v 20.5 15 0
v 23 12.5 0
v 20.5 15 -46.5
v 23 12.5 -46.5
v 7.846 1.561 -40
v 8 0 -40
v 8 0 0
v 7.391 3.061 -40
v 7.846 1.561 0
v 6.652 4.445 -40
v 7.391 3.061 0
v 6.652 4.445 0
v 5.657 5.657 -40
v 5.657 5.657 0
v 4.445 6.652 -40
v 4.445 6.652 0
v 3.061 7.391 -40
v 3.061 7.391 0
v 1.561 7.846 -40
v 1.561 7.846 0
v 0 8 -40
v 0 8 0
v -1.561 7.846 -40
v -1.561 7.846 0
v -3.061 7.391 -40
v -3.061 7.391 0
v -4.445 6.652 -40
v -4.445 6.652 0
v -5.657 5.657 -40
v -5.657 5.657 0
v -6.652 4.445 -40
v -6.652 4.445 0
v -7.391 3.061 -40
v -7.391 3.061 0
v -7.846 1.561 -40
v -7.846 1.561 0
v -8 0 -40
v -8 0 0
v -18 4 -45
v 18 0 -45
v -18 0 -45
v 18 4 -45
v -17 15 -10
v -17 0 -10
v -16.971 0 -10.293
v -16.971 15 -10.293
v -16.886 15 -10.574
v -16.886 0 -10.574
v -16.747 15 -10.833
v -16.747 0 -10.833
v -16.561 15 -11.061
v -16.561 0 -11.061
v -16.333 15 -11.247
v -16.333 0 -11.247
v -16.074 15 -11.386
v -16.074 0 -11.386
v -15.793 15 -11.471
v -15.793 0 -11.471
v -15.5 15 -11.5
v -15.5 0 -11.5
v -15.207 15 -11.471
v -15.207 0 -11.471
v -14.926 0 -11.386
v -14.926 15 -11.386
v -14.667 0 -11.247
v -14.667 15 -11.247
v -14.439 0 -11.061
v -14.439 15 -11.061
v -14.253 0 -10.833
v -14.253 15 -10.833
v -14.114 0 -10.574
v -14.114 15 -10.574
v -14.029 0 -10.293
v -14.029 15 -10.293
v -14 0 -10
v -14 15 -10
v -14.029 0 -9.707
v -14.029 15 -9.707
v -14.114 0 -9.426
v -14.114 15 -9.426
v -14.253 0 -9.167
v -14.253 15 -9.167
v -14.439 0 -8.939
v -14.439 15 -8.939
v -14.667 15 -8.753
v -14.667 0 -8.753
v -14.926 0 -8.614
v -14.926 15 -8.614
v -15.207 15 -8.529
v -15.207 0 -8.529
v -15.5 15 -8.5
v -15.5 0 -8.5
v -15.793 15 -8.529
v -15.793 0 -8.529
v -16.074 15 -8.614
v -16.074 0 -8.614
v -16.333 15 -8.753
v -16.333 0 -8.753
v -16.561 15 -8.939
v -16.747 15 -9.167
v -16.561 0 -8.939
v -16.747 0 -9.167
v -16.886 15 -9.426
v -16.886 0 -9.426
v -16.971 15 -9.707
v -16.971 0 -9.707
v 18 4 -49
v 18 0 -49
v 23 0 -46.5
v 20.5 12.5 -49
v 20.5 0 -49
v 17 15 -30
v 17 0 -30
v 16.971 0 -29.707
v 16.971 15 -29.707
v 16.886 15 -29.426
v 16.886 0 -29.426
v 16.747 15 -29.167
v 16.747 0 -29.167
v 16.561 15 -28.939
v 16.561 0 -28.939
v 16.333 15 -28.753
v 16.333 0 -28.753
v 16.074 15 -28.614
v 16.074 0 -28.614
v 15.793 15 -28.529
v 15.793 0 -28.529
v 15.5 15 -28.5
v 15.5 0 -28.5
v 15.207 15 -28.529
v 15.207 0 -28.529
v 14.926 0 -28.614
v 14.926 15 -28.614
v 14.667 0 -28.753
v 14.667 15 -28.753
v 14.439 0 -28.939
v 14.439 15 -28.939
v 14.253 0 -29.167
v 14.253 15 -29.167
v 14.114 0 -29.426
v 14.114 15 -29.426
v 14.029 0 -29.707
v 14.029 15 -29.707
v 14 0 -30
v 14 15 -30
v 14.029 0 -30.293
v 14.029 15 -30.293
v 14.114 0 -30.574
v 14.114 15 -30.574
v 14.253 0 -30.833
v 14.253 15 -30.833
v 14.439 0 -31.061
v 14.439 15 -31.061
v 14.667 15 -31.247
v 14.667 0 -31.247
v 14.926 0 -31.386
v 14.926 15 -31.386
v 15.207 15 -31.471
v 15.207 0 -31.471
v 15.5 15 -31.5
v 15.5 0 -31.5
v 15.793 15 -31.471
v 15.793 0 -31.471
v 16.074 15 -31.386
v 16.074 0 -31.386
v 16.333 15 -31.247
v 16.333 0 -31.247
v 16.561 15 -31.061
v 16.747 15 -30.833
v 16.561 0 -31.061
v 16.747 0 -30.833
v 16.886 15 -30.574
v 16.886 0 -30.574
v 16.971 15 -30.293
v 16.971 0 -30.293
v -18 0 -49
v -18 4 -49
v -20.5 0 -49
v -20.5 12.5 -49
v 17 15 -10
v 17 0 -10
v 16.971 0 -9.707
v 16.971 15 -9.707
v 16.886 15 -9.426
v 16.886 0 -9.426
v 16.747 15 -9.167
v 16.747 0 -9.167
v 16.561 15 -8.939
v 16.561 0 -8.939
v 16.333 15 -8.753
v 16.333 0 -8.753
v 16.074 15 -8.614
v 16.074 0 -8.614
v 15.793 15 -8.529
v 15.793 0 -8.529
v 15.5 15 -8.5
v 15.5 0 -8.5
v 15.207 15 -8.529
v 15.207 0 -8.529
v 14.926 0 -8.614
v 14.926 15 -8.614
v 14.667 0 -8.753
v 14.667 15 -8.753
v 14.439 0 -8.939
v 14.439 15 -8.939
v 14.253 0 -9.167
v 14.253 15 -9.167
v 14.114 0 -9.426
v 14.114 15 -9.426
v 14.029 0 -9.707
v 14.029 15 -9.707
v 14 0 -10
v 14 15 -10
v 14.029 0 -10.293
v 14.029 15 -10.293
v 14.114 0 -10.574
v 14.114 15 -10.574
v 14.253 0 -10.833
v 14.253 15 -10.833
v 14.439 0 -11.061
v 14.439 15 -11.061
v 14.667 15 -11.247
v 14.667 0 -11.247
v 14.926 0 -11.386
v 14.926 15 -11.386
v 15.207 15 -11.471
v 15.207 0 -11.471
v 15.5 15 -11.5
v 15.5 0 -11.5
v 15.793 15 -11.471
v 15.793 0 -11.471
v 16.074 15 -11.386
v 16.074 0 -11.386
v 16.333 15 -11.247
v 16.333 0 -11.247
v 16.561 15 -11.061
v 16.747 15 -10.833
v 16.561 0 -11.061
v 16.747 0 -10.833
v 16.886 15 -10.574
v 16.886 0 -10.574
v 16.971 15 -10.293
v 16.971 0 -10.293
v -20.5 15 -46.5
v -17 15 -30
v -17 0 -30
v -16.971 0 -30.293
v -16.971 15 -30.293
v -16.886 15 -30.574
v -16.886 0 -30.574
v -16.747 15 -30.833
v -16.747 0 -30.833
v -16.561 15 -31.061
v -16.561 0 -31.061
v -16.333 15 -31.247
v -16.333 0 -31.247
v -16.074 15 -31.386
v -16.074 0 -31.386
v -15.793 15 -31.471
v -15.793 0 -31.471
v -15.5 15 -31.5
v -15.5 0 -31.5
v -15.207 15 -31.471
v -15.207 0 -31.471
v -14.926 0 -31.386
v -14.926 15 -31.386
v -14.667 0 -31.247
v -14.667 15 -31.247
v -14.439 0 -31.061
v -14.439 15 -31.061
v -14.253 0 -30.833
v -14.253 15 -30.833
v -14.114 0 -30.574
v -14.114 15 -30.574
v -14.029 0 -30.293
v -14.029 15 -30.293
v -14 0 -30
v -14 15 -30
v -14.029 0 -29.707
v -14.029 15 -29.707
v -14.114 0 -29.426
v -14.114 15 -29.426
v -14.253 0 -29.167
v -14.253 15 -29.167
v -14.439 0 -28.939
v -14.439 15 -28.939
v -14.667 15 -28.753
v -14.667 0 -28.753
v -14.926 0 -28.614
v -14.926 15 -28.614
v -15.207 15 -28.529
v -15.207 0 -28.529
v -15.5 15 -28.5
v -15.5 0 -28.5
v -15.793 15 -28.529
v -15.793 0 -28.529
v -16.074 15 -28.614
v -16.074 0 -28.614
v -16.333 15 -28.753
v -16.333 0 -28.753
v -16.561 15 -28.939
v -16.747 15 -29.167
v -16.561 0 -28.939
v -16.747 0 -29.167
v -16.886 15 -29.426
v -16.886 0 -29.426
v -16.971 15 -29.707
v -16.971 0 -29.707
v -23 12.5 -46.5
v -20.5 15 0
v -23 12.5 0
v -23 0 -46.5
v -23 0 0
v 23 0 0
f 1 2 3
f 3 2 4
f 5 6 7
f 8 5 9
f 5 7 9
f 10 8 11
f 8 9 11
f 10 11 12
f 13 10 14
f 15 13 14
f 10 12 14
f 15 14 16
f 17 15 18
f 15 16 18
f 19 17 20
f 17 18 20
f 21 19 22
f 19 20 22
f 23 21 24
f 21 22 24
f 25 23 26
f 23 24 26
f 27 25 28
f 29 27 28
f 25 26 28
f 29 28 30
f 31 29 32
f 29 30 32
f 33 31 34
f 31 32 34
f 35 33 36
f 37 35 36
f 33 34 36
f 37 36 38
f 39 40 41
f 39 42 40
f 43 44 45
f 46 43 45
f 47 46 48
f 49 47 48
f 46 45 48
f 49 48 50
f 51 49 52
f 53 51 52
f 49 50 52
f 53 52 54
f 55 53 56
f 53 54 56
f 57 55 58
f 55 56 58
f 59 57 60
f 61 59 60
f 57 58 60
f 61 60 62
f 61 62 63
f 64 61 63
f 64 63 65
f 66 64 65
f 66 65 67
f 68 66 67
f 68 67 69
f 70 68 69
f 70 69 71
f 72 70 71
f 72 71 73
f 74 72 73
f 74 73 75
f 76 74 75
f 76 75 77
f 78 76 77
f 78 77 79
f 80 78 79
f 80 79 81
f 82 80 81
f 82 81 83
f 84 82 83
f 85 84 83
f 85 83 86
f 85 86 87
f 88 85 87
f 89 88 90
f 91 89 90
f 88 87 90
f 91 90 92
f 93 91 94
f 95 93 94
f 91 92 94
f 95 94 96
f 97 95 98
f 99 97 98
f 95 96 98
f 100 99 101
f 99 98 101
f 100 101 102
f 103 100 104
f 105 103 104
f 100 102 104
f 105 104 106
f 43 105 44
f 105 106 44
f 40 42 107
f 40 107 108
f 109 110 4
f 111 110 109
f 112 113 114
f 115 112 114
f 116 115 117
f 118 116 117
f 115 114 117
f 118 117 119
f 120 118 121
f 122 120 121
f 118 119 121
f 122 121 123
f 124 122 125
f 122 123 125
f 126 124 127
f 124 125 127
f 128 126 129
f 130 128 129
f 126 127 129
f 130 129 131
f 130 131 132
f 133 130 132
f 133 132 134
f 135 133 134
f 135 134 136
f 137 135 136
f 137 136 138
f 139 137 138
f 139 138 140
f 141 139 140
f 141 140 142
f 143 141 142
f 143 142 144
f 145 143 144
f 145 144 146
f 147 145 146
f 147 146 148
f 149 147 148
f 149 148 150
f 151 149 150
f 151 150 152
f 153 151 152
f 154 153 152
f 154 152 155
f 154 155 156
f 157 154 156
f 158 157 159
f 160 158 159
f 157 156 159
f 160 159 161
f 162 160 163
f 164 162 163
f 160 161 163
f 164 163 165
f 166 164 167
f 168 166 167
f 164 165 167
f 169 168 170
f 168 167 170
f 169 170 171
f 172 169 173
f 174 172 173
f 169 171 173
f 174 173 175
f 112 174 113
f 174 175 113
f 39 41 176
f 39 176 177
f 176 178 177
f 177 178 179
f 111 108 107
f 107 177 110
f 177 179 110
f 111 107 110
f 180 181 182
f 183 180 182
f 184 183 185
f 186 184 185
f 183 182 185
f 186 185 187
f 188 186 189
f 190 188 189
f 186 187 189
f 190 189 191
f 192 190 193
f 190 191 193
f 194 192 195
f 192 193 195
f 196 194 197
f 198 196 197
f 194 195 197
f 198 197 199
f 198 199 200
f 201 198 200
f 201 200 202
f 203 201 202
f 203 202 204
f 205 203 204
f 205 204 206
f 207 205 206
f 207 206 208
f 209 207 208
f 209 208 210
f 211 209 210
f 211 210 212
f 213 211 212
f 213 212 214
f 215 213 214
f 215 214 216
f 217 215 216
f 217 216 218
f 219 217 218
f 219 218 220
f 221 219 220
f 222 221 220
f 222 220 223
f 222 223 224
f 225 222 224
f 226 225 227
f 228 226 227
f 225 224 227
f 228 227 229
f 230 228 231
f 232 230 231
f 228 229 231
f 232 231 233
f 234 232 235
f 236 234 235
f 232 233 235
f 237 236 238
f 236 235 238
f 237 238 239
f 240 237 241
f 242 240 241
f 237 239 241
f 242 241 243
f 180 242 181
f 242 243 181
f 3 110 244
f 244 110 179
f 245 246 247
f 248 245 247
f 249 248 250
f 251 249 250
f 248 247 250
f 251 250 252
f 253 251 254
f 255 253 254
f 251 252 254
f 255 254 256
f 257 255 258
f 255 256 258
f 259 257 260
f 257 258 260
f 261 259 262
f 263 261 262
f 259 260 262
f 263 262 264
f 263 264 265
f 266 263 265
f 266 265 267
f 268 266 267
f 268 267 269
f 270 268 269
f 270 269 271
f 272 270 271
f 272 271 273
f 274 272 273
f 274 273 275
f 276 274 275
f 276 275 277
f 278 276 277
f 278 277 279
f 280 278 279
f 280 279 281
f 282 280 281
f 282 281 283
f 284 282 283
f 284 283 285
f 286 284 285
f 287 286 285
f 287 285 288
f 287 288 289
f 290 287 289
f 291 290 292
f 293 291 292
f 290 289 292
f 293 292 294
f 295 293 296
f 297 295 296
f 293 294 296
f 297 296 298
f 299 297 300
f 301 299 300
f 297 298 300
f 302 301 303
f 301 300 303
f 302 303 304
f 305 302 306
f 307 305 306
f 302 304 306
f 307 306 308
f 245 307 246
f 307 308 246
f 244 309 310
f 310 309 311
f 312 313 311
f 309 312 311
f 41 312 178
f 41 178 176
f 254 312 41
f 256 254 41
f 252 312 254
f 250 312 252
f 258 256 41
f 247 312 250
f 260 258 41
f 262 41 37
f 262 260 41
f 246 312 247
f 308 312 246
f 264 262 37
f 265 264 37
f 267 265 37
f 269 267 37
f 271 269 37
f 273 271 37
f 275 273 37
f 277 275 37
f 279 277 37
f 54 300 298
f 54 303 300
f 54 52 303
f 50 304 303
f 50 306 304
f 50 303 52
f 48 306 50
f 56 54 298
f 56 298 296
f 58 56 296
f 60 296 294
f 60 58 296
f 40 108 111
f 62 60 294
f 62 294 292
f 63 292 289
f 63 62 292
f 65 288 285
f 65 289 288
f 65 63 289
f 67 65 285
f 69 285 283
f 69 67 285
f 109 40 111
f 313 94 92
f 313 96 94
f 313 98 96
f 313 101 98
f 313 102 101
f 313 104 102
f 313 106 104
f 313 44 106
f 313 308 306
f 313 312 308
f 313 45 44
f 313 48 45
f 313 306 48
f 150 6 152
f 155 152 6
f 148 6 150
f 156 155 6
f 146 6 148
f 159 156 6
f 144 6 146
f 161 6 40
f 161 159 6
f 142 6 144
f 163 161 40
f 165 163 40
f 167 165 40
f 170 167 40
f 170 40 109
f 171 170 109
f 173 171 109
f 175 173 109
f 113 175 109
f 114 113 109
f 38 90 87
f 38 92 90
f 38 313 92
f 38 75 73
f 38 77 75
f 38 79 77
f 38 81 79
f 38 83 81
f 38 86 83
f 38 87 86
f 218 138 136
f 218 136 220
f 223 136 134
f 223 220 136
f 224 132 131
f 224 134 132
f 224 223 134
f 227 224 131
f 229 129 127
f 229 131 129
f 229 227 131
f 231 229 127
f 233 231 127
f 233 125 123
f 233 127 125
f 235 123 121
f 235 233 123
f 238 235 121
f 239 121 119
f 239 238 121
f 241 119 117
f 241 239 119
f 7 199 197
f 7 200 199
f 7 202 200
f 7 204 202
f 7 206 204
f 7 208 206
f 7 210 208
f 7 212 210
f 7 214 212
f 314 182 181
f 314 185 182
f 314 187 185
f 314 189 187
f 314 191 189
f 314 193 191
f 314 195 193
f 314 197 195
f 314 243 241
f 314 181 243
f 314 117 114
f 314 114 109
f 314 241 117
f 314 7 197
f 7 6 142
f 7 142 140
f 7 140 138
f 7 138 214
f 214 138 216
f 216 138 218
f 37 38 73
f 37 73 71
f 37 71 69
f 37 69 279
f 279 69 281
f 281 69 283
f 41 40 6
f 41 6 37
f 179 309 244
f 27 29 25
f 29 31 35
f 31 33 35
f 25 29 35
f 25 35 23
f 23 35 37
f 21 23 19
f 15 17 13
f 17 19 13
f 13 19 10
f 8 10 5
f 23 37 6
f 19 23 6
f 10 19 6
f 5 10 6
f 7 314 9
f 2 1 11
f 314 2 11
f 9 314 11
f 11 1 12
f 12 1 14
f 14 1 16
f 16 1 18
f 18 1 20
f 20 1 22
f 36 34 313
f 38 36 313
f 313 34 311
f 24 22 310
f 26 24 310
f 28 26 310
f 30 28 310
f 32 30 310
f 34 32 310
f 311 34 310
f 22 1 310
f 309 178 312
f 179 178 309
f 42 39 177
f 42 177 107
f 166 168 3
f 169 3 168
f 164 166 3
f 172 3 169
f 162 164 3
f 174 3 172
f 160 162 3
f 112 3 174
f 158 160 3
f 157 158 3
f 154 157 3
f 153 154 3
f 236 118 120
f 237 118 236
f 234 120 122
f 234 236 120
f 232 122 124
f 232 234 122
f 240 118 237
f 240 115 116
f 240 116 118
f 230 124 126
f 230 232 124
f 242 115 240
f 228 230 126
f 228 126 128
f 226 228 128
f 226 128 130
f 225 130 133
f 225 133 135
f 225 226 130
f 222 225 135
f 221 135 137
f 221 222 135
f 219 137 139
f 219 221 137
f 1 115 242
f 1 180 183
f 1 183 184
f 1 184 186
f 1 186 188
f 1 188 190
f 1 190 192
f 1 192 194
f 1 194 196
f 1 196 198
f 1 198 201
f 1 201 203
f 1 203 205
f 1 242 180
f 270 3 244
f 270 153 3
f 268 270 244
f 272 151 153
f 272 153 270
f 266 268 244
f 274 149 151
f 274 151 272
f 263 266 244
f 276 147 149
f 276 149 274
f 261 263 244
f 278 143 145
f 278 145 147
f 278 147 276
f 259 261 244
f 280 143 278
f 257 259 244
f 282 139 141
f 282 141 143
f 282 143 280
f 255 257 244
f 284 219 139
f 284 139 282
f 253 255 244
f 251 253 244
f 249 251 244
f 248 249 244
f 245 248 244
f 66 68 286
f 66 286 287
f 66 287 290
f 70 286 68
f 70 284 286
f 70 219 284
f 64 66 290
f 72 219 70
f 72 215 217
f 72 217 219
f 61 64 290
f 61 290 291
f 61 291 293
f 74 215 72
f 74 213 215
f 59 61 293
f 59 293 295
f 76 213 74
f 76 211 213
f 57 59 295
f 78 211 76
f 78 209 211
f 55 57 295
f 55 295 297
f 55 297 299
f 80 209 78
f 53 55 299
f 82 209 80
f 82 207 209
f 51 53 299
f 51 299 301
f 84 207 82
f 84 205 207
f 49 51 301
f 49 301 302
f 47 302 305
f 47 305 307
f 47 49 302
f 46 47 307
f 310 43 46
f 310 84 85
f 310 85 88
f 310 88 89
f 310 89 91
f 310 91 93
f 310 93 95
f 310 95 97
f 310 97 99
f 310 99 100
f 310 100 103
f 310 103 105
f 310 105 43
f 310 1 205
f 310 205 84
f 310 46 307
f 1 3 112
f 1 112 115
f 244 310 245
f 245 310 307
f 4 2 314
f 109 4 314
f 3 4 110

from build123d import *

# Parameters (mm, degrees)
Y_KSEKLIK_EKSTR_ZYON1_DEPTH = 45
IZIM2_W                     = 46
IZIM2_H                     = 5
Y_KSEKLIK_EKSTR_ZYON2_DEPTH = 14
Y_KSEKLIK_EKSTR_ZYON3_DEPTH = 4
PAH1_SIZE                   = 2.5
IZIM4_R                     = 1.5
KES_EKSTR_ZYON1_DEPTH       = 35


with BuildPart() as part:
    # Çizim1 → Yükseklik-Ekstrüzyon1 (new body)
    with BuildSketch(Plane.XY):
        with BuildLine():
            Line((-8, 0), (-23, 0))
            Line((-23, 0), (-23, 15))
            Line((-23, 15), (23, 15))
            Line((23, 15), (23, 0))
            Line((23, 0), (8, 0))
            ThreePointArc((8, 0), (0, 8), (-8, 0))
        make_face()
    extrude(amount=-Y_KSEKLIK_EKSTR_ZYON1_DEPTH)

    # Çizim2 → Yükseklik-Ekstrüzyon2 (add)
    with BuildSketch(Plane.XZ):
        with Locations((0, -42.5)):
            Rectangle(IZIM2_W, IZIM2_H)
    extrude(amount=-Y_KSEKLIK_EKSTR_ZYON2_DEPTH)

    # Çizim3 → Yükseklik-Ekstrüzyon3 (add)
    with BuildSketch(Plane(origin=(0, 0, -45), x_dir=(-1, 0, 0), z_dir=(0, 0, -1))):
        Polygon((-23, 15), (23, 15), (23, 4), (23, 0), (18, 0), (18, 4), (-18, 4), (-18, 0), (-23, 0), (-23, 4), align=None)
    extrude(amount=Y_KSEKLIK_EKSTR_ZYON3_DEPTH)

    # Pah1
    pah1_edges = [part.edges().sort_by_distance(p)[0] for p in [
        (-23, 15, -24.5),
        (23, 15, -24.5),
        (23, 7.5, -49),
        (-23, 7.5, -49),
        (0, 15, -49),
    ]]
    chamfer(pah1_edges, length=PAH1_SIZE)

    # Çizim4 → Kes-Ekstrüzyon1 (cut)
    with BuildSketch(Plane.XZ):
        with Locations((15.5, -10)):
            Circle(IZIM4_R)
        with Locations((15.5, -30)):
            Circle(IZIM4_R)
        with Locations(Location((-15.5, -30, 0), (0, 0, 180))):
            Circle(IZIM4_R)
        with Locations(Location((-15.5, -10, 0), (0, 0, 180))):
            Circle(IZIM4_R)
    extrude(amount=-KES_EKSTR_ZYON1_DEPTH, mode=Mode.SUBTRACT)


solid = part.part
